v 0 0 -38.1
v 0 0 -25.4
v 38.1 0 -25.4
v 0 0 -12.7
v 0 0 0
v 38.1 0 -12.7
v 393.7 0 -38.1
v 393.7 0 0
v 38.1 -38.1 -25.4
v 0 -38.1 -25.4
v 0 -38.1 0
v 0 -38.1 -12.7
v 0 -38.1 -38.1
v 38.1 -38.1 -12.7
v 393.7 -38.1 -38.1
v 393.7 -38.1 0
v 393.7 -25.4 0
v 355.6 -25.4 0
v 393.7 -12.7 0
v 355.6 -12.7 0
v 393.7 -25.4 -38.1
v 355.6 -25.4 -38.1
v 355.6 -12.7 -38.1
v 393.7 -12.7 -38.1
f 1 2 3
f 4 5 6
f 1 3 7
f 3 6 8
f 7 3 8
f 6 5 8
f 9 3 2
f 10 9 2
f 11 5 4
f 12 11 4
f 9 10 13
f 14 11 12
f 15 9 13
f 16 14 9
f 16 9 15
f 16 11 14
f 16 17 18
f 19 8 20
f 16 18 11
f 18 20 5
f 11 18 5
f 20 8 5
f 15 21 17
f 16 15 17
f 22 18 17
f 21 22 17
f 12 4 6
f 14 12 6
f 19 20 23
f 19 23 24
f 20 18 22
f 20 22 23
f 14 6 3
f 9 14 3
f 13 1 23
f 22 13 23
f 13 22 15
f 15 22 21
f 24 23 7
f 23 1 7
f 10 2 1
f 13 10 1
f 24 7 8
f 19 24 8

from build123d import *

# Parameters (mm, degrees)
F1_DEPTH = 38.1
F2_W     = 38.1
F2_H     = 12.7
F3_DEPTH = 38.1


with BuildPart() as f1:
    # F0 (on Front) → F1 (new body)
    with BuildSketch(Plane.XZ):
        Polygon((393.7, 0), (0, 0), (0, -12.7), (38.1, -12.7), (38.1, -25.4), (0, -25.4), (0, -38.1), (393.7, -38.1), align=None)
    extrude(amount=F1_DEPTH)

    # F2 (on face) → F3 (cut)
    with BuildSketch(Plane.XY):
        with Locations((374.65, -19.05)):
            Rectangle(F2_W, F2_H)
    extrude(amount=-F3_DEPTH, mode=Mode.SUBTRACT)


solid = f1.part
